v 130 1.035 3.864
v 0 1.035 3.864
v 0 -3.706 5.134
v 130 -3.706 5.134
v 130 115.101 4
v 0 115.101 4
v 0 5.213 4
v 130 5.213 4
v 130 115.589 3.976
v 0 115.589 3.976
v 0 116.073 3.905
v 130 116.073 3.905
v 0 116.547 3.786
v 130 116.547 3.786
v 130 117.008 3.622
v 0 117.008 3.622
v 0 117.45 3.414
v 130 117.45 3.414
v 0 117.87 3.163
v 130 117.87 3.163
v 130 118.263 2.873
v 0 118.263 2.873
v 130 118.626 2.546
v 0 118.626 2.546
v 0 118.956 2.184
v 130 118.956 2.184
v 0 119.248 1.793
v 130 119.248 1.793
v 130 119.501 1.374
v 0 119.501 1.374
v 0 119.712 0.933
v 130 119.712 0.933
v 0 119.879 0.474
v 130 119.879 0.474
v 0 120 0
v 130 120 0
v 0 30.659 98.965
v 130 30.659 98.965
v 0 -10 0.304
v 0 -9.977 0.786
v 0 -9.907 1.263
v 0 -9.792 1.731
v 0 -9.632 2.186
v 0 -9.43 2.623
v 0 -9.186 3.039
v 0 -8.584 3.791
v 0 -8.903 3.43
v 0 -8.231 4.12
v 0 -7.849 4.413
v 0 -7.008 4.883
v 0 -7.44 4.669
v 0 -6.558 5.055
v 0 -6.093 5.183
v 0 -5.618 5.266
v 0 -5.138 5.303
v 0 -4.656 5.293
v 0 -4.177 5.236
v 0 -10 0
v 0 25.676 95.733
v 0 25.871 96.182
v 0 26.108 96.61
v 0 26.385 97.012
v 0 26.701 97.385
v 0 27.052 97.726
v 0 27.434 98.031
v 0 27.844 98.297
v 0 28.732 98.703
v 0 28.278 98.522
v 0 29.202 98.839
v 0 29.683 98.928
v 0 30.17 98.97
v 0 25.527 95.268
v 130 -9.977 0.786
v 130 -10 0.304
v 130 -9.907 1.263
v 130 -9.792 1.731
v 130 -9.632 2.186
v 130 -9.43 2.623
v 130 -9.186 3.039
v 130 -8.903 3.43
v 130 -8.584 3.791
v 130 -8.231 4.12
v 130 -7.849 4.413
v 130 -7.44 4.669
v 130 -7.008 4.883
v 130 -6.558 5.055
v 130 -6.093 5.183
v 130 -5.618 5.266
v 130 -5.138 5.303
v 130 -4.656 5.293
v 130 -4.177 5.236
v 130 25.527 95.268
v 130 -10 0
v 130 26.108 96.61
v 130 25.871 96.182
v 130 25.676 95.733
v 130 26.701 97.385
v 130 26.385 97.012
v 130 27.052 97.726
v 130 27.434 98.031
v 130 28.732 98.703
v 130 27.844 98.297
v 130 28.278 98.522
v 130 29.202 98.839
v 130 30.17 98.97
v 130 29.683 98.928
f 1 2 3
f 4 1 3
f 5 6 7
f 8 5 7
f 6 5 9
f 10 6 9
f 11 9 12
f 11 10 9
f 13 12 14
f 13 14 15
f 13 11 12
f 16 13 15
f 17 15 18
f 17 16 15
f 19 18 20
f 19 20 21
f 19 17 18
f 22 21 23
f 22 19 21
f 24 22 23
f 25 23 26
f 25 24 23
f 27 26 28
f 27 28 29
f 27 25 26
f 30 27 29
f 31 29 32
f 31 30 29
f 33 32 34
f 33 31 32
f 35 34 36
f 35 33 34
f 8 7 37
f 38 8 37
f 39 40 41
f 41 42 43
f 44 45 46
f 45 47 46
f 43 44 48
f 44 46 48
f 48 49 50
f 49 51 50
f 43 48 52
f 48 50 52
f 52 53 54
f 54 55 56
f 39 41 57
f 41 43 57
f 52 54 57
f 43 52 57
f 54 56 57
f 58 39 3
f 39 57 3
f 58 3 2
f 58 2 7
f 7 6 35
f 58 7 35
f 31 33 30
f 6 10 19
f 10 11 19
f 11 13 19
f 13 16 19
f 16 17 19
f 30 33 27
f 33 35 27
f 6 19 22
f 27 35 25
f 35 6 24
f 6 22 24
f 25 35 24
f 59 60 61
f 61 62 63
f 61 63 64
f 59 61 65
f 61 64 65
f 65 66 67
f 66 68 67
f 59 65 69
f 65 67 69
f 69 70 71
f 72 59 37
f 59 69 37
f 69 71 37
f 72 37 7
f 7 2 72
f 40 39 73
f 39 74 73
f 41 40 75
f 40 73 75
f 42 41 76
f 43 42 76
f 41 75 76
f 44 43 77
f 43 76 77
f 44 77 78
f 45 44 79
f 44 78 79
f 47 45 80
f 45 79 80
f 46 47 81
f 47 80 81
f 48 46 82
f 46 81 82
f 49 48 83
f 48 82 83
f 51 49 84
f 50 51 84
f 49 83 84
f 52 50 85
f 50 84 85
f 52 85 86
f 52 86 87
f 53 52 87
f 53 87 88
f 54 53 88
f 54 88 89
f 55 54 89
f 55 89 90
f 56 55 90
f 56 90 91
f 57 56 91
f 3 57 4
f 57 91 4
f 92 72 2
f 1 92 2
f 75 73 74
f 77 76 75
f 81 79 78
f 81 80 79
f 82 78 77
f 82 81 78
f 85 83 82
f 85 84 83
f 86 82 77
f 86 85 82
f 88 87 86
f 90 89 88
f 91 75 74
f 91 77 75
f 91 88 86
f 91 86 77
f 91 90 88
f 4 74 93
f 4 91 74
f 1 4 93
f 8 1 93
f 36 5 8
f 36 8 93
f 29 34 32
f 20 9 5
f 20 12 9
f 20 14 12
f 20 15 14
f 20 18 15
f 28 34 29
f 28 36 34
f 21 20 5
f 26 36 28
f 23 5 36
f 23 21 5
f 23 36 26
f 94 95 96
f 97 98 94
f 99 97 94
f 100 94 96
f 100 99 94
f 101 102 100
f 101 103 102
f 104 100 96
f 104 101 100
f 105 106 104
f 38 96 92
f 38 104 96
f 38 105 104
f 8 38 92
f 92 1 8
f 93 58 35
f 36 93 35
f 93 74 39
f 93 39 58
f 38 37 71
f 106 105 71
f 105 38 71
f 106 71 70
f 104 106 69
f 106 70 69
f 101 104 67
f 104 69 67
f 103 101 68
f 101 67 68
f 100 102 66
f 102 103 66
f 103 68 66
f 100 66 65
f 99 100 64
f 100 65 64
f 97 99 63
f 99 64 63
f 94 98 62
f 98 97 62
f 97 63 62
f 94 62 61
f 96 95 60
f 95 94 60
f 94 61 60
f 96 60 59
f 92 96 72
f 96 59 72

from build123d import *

# Parameters (mm, degrees)
F1_DEPTH    = 130
F2_T1_DEPTH = 154.4948974279
F3_T1_DEPTH = 154.4948974279
F4_R        = 5


# Not quite as in the source:
# - a fillet or chamfer that OpenCascade refuses, or shapes differently, is made with other operations: its cross-section is extruded or revolved along the edge and cut away or added


with BuildPart() as f1:
    # F0 (on Right) → F1 (new body)
    with BuildSketch(Plane.YZ):
        Polygon((1.0352761804, 3.8637033052), (0, 0), (120, 0), (120, 4), (5.2129014914, 4), (30.6586225483, 98.9647238196), (26.7949192431, 100), align=None)
        Polygon((-10, 0), (0, 0), (1.0352761804, 3.8637033052), (-10, 6.820596646), (-10, 4.0079755444), align=None)
    extrude(amount=F1_DEPTH)

    # F2: fillet of radius 5 on 1 edges, made by hand

    # F2_s2 → F2_t1 (cut)
    with BuildSketch(Plane.YZ.offset(-12.2474487139)):
        with BuildLine():
            ThreePointArc((30.6586225483, 98.9647238196), (27.4340422276, 98.0307814801), (25.5269700507, 95.2679491924))
            Line((25.5269700507, 95.2679491924), (26.7949192431, 100))
            Line((26.7949192431, 100), (30.6586225483, 98.9647238196))
        make_face()
    extrude(amount=F2_T1_DEPTH, mode=Mode.SUBTRACT)

    # F3: fillet of radius 5 on 1 edges, made by hand

    # F3_s2 → F3_t1 (cut)
    with BuildSketch(Plane.YZ.offset(-12.2474487139)):
        with BuildLine():
            ThreePointArc((115.1010205144, 4), (118.2632981746, 2.8729833462), (120, 0))
            Line((120, 0), (120, 4))
            Line((120, 4), (115.1010205144, 4))
        make_face()
    extrude(amount=F3_T1_DEPTH, mode=Mode.SUBTRACT)

    # F4
    f4_edges = [f1.edges().sort_by_distance(p)[0] for p in [
        (65, -10, 6.820597),
    ]]
    fillet(f4_edges, radius=F4_R)


solid = f1.part
